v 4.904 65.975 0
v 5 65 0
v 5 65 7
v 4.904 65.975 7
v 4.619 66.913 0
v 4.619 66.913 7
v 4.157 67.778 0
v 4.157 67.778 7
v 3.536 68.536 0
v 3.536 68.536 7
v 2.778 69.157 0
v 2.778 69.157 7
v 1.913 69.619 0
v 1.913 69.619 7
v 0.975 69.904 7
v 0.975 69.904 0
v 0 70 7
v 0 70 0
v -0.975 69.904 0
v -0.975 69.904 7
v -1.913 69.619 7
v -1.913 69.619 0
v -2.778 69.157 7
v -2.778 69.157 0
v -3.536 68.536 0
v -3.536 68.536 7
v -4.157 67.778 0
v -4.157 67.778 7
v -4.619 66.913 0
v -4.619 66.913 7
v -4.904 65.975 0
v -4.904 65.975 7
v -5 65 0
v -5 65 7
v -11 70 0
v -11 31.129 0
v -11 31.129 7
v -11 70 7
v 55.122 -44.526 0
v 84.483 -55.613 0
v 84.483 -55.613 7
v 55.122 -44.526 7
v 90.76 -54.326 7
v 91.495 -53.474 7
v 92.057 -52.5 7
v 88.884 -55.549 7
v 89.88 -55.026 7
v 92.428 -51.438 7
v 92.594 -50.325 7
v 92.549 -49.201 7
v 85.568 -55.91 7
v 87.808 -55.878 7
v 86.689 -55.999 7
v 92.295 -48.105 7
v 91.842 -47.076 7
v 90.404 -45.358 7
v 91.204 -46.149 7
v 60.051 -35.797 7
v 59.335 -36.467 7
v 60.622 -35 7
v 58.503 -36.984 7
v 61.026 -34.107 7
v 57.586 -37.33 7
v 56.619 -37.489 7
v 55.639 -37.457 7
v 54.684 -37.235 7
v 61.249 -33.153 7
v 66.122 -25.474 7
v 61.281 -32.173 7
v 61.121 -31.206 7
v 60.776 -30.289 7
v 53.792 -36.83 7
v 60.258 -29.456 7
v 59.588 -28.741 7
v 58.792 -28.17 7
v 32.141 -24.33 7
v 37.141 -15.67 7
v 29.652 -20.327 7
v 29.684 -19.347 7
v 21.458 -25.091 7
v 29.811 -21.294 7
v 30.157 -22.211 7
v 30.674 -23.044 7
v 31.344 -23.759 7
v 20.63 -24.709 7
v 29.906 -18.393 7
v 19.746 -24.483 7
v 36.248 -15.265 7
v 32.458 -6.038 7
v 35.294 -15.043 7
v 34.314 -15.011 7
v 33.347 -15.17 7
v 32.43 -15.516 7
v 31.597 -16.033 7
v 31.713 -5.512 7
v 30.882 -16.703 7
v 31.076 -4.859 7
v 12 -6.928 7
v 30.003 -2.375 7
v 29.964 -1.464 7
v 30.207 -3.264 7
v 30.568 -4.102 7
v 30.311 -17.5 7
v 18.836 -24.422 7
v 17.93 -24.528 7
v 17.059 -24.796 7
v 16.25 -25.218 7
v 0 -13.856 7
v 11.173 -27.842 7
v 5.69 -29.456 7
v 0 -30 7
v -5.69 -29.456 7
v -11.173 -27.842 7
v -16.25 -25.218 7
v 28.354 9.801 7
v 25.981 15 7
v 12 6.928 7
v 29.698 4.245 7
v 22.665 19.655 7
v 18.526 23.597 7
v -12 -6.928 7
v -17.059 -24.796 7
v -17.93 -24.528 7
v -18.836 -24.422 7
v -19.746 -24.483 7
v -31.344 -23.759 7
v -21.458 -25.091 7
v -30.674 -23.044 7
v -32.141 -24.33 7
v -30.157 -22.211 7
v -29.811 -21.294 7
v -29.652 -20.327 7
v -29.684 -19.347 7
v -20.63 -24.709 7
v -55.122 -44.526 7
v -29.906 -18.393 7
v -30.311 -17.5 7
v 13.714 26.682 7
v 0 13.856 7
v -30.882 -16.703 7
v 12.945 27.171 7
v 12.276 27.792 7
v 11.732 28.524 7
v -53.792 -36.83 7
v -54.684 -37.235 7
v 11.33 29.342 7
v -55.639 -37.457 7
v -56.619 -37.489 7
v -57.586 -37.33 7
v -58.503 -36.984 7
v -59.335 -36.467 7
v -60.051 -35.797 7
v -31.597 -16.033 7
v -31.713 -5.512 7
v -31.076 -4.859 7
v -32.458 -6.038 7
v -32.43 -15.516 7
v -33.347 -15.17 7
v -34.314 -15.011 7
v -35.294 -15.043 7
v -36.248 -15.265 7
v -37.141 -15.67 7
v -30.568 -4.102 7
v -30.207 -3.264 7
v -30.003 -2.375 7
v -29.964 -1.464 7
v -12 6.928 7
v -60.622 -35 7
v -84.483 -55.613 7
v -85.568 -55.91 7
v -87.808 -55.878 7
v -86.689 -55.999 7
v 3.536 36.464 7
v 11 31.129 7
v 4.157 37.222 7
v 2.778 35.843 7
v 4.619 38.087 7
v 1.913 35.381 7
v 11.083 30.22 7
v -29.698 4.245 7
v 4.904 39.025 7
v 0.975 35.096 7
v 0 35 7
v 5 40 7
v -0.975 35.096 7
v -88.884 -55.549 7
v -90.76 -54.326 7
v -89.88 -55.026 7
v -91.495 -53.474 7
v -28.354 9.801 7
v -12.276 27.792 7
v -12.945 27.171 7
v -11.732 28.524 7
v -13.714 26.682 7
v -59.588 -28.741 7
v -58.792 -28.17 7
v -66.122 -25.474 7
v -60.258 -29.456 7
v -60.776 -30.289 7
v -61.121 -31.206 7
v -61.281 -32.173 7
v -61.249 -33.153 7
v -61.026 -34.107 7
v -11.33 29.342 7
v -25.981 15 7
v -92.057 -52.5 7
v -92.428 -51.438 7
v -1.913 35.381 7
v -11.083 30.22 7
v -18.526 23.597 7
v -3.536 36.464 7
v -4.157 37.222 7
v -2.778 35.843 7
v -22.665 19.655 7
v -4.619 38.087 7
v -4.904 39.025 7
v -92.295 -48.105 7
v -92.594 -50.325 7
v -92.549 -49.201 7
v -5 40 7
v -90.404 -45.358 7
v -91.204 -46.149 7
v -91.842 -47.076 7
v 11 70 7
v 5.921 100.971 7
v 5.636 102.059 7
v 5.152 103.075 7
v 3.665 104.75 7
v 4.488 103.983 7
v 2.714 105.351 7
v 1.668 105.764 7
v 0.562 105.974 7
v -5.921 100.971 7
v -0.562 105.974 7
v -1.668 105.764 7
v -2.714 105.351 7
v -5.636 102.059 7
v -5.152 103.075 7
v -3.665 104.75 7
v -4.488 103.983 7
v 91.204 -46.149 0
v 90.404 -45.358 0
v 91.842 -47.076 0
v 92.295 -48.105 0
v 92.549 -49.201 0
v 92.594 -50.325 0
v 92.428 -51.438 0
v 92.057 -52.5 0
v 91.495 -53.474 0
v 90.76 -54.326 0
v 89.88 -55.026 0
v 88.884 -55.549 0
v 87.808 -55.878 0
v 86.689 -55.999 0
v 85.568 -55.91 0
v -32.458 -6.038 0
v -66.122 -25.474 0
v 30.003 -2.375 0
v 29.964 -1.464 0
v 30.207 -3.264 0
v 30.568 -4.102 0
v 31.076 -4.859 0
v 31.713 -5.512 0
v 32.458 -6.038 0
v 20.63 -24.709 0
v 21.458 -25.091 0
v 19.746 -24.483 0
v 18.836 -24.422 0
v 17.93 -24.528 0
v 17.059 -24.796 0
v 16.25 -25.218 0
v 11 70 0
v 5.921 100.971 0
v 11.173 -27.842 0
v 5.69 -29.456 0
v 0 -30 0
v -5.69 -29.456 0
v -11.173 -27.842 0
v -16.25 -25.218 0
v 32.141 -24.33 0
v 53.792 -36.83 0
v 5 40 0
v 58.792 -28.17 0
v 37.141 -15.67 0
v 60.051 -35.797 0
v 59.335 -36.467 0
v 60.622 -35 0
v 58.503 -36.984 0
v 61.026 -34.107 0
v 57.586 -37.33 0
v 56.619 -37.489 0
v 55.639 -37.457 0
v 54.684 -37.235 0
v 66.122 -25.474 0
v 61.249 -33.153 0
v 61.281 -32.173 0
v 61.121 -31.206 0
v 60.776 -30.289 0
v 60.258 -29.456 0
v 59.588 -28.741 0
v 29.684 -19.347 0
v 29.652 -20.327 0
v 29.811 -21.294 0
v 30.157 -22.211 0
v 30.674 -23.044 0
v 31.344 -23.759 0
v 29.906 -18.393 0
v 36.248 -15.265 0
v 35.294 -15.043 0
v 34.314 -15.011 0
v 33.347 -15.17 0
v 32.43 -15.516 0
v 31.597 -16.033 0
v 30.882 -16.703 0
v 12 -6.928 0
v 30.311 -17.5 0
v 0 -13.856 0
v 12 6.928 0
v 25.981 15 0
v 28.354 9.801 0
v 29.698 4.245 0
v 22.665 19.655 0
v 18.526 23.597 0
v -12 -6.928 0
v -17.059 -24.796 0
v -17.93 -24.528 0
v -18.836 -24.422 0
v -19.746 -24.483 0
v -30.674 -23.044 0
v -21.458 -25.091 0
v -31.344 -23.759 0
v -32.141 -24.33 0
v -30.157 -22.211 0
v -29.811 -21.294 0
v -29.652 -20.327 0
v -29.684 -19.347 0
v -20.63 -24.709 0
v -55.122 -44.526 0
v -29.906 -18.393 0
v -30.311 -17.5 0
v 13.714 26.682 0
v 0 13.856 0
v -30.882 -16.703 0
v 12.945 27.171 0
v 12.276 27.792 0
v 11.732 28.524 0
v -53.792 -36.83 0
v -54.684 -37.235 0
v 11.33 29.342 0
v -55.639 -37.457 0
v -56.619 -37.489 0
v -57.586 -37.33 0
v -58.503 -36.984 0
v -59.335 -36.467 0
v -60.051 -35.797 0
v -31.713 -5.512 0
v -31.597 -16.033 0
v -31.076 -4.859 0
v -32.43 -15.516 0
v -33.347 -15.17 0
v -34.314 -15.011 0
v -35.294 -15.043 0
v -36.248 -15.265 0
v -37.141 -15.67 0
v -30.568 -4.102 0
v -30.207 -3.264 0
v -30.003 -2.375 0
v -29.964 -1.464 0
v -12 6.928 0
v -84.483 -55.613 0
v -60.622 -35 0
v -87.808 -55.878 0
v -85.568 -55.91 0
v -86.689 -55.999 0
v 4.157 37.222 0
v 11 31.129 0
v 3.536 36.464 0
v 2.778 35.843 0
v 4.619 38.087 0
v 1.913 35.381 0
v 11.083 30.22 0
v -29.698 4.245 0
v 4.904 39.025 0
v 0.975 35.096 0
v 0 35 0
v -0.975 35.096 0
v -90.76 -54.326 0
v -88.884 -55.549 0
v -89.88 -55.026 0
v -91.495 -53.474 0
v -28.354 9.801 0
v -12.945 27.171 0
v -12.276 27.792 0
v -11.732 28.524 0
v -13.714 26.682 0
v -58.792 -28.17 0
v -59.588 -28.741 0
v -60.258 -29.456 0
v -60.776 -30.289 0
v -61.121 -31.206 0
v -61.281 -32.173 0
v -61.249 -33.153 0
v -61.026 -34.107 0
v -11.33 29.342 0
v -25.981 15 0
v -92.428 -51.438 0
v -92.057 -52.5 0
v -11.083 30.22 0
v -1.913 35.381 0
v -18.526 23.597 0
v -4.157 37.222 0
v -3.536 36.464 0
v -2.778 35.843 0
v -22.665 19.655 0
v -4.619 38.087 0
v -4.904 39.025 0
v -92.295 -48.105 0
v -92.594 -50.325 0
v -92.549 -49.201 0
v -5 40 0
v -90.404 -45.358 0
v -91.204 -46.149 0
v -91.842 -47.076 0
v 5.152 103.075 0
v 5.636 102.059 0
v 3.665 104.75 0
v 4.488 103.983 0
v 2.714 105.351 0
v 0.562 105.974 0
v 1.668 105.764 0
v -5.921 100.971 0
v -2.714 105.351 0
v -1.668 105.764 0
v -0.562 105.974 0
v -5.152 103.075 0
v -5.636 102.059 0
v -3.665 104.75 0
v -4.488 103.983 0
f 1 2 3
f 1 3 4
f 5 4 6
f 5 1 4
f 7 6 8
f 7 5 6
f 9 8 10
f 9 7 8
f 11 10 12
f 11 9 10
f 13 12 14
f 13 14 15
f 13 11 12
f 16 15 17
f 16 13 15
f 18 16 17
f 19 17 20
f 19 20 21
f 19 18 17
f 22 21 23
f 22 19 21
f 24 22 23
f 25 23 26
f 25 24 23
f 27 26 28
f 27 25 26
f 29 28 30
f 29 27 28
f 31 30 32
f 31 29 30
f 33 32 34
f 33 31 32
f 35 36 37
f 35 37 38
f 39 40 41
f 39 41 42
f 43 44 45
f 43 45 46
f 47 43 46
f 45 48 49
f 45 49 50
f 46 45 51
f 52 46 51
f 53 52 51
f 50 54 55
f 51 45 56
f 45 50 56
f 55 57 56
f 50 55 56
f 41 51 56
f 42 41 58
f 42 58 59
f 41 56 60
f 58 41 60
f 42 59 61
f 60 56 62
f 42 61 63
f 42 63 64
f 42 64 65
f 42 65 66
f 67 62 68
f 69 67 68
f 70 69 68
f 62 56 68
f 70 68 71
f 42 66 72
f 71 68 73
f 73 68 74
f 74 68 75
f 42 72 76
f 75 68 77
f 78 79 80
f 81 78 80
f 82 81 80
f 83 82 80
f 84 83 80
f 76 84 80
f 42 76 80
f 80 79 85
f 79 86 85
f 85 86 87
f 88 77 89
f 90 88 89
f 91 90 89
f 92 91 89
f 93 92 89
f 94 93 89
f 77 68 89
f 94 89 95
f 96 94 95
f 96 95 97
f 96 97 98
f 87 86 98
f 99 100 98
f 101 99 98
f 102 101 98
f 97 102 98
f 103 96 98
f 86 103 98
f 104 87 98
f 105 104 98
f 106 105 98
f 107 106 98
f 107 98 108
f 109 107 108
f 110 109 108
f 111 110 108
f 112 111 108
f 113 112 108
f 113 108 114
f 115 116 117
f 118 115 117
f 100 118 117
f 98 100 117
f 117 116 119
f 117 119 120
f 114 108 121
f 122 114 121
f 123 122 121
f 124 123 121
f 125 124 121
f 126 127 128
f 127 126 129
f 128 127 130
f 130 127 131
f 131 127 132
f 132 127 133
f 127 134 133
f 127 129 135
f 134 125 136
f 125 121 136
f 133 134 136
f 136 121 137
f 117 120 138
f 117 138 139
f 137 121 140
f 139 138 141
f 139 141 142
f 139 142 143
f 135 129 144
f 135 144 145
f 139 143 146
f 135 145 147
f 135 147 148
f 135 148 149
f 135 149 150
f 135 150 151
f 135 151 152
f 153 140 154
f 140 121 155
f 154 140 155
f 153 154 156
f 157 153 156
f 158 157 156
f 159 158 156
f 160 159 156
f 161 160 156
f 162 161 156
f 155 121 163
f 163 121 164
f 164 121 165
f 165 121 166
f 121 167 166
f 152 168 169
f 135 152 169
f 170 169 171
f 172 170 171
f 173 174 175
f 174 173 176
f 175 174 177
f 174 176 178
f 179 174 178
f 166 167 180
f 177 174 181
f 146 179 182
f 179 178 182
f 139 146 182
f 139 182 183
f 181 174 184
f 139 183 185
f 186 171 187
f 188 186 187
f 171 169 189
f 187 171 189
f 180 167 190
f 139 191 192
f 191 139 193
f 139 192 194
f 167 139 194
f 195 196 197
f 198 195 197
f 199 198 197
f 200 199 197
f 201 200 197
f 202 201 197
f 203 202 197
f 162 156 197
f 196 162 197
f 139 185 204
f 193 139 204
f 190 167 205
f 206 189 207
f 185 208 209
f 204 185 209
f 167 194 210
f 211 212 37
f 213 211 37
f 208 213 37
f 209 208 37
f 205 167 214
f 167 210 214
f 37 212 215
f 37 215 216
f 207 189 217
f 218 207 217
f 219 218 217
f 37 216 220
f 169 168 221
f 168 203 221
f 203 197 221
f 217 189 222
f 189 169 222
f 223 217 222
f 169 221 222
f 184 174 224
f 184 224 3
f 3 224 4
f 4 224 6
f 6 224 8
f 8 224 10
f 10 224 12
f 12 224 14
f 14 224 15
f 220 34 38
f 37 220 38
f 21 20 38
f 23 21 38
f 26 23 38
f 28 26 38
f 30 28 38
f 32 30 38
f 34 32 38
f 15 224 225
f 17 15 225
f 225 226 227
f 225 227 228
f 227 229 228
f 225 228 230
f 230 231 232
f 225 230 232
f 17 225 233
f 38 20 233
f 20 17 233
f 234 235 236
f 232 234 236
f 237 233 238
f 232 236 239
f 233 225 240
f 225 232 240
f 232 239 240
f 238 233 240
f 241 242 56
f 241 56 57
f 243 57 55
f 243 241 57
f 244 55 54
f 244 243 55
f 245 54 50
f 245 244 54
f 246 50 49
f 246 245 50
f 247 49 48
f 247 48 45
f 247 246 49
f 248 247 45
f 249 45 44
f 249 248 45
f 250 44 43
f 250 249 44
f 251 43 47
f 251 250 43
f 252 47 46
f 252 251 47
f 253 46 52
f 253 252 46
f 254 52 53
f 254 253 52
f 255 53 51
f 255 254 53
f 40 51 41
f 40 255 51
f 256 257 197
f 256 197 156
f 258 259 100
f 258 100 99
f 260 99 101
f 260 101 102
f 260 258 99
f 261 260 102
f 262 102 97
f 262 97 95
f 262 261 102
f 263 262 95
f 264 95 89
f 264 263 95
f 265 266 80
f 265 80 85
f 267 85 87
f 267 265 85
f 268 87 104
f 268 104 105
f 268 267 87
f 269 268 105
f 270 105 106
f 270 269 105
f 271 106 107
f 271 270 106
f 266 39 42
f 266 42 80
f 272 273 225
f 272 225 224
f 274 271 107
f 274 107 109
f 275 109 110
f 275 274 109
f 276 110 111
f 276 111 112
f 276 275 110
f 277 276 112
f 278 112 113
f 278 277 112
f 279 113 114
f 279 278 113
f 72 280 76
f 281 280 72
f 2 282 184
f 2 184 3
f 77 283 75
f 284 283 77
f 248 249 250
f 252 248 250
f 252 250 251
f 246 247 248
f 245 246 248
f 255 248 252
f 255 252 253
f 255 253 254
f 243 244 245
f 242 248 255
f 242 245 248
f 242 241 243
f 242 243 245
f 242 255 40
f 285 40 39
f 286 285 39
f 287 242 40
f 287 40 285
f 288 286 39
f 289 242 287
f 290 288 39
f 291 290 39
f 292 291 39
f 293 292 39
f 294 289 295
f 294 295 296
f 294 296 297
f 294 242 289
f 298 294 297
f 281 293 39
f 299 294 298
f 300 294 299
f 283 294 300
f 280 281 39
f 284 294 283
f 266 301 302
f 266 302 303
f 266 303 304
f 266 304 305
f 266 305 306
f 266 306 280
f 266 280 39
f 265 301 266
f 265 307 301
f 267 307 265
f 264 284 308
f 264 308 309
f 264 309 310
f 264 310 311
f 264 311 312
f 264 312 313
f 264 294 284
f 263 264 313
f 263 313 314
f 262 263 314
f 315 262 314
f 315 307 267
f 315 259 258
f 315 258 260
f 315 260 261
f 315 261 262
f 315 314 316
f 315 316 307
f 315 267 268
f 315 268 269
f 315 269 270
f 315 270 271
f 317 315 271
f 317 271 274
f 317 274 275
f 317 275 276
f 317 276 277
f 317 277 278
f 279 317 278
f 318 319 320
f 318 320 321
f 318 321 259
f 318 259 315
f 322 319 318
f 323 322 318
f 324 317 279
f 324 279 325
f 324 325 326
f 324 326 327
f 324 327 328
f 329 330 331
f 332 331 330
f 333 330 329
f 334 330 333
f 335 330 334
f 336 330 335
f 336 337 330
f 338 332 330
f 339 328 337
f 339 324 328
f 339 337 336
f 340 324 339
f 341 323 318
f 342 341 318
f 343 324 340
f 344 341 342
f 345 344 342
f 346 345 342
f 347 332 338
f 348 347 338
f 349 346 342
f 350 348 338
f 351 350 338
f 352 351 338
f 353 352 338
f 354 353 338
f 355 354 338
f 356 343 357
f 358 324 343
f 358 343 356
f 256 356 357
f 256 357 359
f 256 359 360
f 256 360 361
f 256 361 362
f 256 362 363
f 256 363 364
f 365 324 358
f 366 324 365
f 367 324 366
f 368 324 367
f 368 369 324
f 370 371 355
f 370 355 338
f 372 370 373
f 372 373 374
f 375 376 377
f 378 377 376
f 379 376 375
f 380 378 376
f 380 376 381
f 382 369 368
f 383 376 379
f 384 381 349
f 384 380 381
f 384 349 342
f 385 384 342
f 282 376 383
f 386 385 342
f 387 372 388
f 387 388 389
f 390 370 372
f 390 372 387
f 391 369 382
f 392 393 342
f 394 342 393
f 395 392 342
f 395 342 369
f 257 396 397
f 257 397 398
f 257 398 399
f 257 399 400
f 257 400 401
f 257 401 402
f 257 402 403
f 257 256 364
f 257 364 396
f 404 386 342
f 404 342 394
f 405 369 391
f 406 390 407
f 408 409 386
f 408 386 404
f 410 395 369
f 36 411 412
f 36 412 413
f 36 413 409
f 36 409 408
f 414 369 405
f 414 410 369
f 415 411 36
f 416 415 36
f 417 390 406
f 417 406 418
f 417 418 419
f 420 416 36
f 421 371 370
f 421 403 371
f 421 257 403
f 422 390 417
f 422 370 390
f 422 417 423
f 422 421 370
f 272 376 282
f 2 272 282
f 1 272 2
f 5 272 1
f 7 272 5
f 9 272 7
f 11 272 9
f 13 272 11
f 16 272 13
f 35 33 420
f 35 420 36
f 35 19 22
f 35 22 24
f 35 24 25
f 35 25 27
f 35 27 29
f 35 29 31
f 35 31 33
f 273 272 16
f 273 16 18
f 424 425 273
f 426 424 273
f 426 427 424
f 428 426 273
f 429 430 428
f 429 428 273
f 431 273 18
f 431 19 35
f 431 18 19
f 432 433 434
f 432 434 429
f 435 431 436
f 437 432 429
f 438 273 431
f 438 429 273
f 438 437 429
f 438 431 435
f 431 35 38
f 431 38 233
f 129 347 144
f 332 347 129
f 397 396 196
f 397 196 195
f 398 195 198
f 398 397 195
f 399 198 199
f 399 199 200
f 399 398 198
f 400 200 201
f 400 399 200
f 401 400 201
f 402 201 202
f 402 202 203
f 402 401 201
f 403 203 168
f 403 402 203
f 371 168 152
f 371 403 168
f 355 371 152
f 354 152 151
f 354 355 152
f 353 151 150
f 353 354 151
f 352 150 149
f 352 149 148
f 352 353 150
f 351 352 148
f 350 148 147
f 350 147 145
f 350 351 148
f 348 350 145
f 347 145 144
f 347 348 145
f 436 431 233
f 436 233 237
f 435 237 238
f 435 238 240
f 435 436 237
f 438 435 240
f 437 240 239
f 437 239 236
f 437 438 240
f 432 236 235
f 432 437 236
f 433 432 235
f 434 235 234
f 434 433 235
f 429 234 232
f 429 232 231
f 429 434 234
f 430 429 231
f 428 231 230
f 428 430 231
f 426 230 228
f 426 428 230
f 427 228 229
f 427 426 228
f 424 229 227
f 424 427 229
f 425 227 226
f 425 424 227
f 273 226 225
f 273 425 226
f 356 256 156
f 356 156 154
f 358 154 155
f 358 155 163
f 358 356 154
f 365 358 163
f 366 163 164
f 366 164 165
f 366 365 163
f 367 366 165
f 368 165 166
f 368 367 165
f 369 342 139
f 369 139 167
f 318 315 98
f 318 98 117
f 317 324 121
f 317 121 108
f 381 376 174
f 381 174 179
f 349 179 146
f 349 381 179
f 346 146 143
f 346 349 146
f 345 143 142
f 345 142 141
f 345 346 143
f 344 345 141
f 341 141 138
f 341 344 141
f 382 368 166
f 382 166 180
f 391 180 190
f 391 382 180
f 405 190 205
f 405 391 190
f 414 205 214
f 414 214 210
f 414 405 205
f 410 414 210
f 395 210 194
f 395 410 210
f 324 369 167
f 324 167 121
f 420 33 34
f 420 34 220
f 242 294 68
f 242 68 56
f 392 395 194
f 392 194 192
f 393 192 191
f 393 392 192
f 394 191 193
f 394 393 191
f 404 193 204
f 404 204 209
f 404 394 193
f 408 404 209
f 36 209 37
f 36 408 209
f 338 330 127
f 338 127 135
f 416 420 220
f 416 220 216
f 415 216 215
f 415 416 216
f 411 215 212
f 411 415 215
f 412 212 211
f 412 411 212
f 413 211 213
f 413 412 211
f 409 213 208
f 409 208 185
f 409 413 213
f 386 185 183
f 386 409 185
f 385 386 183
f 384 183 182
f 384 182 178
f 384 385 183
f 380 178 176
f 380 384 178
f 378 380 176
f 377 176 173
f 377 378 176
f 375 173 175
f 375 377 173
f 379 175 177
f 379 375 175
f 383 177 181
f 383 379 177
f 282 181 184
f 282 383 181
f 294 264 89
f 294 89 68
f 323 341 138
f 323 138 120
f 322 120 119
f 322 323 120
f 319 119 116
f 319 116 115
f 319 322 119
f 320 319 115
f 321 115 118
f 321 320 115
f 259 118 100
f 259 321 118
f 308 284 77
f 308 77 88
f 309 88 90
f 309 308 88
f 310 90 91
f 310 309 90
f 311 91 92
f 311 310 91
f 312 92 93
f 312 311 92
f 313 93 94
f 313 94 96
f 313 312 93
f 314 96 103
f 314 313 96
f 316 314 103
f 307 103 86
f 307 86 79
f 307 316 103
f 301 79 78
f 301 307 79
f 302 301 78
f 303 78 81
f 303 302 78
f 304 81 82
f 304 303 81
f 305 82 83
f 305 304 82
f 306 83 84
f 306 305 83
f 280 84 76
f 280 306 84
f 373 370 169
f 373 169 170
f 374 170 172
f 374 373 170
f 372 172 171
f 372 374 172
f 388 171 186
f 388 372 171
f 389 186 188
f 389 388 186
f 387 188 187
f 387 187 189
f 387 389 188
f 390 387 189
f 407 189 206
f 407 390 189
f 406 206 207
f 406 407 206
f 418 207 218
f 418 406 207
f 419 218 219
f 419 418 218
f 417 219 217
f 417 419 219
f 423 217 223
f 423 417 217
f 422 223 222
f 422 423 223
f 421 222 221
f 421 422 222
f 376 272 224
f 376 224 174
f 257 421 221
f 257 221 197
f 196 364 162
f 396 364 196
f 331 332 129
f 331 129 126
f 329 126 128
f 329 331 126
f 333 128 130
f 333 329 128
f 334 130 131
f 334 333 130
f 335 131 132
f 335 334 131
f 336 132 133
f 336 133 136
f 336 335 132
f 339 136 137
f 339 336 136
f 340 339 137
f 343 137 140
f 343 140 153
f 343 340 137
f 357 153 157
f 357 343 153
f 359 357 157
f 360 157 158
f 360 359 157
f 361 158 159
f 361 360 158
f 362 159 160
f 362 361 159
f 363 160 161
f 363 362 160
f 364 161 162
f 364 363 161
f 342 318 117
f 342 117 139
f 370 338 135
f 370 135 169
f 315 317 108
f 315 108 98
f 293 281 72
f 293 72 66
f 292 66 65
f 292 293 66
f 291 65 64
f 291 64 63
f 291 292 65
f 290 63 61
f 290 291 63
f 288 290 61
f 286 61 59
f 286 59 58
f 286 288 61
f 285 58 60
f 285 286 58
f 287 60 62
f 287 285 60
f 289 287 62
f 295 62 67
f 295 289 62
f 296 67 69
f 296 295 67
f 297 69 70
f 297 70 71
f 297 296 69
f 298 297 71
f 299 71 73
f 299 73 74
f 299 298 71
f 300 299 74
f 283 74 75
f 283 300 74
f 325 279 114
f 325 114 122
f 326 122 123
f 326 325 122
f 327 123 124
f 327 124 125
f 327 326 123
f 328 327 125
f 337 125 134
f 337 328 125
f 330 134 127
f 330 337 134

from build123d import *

# Parameters (mm, degrees)
P_IDAT_VYSUNUT_M1_DEPTH = 7


with BuildPart() as part:
    # Skica1 → Přidat vysunutím1 (new body)
    with BuildSketch(Plane.XY):
        with BuildLine():
            Line((-11, 31.128764833), (-11, 70))
            Line((-11, 70), (-5.920908656, 100.97099984))
            ThreePointArc((-5.920908656, 100.97099984), (0, 106), (5.920908656, 100.97099984))
            Line((5.920908656, 100.97099984), (11, 70))
            Line((11, 70), (11, 31.128764833))
            ThreePointArc((11, 31.128764833), (11.732180215, 28.523824471), (13.714285714, 26.681798428))
            ThreePointArc((13.714285714, 26.681798428), (25.980762114, 15), (29.964258114, -1.463979391))
            ThreePointArc((29.964258114, -1.463979391), (30.568446713, -4.101546127), (32.458301133, -6.038102975))
            Line((32.458301133, -6.038102975), (66.121778265, -25.473720558))
            Line((66.121778265, -25.473720558), (90.403905235, -45.357842611))
            ThreePointArc((90.403905235, -45.357842611), (91.798692801, -53), (84.482996579, -55.61315723))
            Line((84.482996579, -55.61315723), (55.121778265, -44.526279442))
            Line((55.121778265, -44.526279442), (21.458301133, -25.090661858))
            ThreePointArc((21.458301133, -25.090661858), (18.836266498, -24.422278344), (16.2499724, -25.217819037))
            ThreePointArc((16.2499724, -25.217819037), (0, -30), (-16.2499724, -25.217819037))
            ThreePointArc((-16.2499724, -25.217819037), (-18.836266498, -24.422278344), (-21.458301133, -25.090661858))
            Line((-21.458301133, -25.090661858), (-55.121778265, -44.526279442))
            Line((-55.121778265, -44.526279442), (-84.482996579, -55.61315723))
            ThreePointArc((-84.482996579, -55.61315723), (-91.798692801, -53), (-90.403905235, -45.357842611))
            Line((-90.403905235, -45.357842611), (-66.121778265, -25.473720558))
            Line((-66.121778265, -25.473720558), (-32.458301133, -6.038102975))
            ThreePointArc((-32.458301133, -6.038102975), (-30.568446713, -4.101546127), (-29.964258114, -1.463979391))
            ThreePointArc((-29.964258114, -1.463979391), (-25.980762114, 15), (-13.714285714, 26.681798428))
            ThreePointArc((-13.714285714, 26.681798428), (-11.732180215, 28.523824471), (-11, 31.128764833))
        make_face()
        with BuildLine():
            Line((-5, 65), (-5, 40))
            ThreePointArc((-5, 40), (0, 35), (5, 40))
            Line((5, 40), (5, 65))
            ThreePointArc((5, 65), (0, 70), (-5, 65))
        make_face(mode=Mode.SUBTRACT)
        with BuildLine():
            Line((58.791651246, -28.169872981), (37.141016151, -15.669872981))
            ThreePointArc((37.141016151, -15.669872981), (30.310889132, -17.5), (32.141016151, -24.330127019))
            Line((32.141016151, -24.330127019), (53.791651246, -36.830127019))
            ThreePointArc((53.791651246, -36.830127019), (60.621778265, -35), (58.791651246, -28.169872981))
        make_face(mode=Mode.SUBTRACT)
        Polygon((0, -13.856406461), (12, -6.92820323), (12, 6.92820323), (0, 13.856406461), (-12, 6.92820323), (-12, -6.92820323), align=None, mode=Mode.SUBTRACT)
        with BuildLine():
            Line((-53.791651246, -36.830127019), (-32.141016151, -24.330127019))
            ThreePointArc((-32.141016151, -24.330127019), (-30.310889132, -17.5), (-37.141016151, -15.669872981))
            Line((-37.141016151, -15.669872981), (-58.791651246, -28.169872981))
            ThreePointArc((-58.791651246, -28.169872981), (-60.621778265, -35), (-53.791651246, -36.830127019))
        make_face(mode=Mode.SUBTRACT)
    extrude(amount=P_IDAT_VYSUNUT_M1_DEPTH)


solid = part.part
